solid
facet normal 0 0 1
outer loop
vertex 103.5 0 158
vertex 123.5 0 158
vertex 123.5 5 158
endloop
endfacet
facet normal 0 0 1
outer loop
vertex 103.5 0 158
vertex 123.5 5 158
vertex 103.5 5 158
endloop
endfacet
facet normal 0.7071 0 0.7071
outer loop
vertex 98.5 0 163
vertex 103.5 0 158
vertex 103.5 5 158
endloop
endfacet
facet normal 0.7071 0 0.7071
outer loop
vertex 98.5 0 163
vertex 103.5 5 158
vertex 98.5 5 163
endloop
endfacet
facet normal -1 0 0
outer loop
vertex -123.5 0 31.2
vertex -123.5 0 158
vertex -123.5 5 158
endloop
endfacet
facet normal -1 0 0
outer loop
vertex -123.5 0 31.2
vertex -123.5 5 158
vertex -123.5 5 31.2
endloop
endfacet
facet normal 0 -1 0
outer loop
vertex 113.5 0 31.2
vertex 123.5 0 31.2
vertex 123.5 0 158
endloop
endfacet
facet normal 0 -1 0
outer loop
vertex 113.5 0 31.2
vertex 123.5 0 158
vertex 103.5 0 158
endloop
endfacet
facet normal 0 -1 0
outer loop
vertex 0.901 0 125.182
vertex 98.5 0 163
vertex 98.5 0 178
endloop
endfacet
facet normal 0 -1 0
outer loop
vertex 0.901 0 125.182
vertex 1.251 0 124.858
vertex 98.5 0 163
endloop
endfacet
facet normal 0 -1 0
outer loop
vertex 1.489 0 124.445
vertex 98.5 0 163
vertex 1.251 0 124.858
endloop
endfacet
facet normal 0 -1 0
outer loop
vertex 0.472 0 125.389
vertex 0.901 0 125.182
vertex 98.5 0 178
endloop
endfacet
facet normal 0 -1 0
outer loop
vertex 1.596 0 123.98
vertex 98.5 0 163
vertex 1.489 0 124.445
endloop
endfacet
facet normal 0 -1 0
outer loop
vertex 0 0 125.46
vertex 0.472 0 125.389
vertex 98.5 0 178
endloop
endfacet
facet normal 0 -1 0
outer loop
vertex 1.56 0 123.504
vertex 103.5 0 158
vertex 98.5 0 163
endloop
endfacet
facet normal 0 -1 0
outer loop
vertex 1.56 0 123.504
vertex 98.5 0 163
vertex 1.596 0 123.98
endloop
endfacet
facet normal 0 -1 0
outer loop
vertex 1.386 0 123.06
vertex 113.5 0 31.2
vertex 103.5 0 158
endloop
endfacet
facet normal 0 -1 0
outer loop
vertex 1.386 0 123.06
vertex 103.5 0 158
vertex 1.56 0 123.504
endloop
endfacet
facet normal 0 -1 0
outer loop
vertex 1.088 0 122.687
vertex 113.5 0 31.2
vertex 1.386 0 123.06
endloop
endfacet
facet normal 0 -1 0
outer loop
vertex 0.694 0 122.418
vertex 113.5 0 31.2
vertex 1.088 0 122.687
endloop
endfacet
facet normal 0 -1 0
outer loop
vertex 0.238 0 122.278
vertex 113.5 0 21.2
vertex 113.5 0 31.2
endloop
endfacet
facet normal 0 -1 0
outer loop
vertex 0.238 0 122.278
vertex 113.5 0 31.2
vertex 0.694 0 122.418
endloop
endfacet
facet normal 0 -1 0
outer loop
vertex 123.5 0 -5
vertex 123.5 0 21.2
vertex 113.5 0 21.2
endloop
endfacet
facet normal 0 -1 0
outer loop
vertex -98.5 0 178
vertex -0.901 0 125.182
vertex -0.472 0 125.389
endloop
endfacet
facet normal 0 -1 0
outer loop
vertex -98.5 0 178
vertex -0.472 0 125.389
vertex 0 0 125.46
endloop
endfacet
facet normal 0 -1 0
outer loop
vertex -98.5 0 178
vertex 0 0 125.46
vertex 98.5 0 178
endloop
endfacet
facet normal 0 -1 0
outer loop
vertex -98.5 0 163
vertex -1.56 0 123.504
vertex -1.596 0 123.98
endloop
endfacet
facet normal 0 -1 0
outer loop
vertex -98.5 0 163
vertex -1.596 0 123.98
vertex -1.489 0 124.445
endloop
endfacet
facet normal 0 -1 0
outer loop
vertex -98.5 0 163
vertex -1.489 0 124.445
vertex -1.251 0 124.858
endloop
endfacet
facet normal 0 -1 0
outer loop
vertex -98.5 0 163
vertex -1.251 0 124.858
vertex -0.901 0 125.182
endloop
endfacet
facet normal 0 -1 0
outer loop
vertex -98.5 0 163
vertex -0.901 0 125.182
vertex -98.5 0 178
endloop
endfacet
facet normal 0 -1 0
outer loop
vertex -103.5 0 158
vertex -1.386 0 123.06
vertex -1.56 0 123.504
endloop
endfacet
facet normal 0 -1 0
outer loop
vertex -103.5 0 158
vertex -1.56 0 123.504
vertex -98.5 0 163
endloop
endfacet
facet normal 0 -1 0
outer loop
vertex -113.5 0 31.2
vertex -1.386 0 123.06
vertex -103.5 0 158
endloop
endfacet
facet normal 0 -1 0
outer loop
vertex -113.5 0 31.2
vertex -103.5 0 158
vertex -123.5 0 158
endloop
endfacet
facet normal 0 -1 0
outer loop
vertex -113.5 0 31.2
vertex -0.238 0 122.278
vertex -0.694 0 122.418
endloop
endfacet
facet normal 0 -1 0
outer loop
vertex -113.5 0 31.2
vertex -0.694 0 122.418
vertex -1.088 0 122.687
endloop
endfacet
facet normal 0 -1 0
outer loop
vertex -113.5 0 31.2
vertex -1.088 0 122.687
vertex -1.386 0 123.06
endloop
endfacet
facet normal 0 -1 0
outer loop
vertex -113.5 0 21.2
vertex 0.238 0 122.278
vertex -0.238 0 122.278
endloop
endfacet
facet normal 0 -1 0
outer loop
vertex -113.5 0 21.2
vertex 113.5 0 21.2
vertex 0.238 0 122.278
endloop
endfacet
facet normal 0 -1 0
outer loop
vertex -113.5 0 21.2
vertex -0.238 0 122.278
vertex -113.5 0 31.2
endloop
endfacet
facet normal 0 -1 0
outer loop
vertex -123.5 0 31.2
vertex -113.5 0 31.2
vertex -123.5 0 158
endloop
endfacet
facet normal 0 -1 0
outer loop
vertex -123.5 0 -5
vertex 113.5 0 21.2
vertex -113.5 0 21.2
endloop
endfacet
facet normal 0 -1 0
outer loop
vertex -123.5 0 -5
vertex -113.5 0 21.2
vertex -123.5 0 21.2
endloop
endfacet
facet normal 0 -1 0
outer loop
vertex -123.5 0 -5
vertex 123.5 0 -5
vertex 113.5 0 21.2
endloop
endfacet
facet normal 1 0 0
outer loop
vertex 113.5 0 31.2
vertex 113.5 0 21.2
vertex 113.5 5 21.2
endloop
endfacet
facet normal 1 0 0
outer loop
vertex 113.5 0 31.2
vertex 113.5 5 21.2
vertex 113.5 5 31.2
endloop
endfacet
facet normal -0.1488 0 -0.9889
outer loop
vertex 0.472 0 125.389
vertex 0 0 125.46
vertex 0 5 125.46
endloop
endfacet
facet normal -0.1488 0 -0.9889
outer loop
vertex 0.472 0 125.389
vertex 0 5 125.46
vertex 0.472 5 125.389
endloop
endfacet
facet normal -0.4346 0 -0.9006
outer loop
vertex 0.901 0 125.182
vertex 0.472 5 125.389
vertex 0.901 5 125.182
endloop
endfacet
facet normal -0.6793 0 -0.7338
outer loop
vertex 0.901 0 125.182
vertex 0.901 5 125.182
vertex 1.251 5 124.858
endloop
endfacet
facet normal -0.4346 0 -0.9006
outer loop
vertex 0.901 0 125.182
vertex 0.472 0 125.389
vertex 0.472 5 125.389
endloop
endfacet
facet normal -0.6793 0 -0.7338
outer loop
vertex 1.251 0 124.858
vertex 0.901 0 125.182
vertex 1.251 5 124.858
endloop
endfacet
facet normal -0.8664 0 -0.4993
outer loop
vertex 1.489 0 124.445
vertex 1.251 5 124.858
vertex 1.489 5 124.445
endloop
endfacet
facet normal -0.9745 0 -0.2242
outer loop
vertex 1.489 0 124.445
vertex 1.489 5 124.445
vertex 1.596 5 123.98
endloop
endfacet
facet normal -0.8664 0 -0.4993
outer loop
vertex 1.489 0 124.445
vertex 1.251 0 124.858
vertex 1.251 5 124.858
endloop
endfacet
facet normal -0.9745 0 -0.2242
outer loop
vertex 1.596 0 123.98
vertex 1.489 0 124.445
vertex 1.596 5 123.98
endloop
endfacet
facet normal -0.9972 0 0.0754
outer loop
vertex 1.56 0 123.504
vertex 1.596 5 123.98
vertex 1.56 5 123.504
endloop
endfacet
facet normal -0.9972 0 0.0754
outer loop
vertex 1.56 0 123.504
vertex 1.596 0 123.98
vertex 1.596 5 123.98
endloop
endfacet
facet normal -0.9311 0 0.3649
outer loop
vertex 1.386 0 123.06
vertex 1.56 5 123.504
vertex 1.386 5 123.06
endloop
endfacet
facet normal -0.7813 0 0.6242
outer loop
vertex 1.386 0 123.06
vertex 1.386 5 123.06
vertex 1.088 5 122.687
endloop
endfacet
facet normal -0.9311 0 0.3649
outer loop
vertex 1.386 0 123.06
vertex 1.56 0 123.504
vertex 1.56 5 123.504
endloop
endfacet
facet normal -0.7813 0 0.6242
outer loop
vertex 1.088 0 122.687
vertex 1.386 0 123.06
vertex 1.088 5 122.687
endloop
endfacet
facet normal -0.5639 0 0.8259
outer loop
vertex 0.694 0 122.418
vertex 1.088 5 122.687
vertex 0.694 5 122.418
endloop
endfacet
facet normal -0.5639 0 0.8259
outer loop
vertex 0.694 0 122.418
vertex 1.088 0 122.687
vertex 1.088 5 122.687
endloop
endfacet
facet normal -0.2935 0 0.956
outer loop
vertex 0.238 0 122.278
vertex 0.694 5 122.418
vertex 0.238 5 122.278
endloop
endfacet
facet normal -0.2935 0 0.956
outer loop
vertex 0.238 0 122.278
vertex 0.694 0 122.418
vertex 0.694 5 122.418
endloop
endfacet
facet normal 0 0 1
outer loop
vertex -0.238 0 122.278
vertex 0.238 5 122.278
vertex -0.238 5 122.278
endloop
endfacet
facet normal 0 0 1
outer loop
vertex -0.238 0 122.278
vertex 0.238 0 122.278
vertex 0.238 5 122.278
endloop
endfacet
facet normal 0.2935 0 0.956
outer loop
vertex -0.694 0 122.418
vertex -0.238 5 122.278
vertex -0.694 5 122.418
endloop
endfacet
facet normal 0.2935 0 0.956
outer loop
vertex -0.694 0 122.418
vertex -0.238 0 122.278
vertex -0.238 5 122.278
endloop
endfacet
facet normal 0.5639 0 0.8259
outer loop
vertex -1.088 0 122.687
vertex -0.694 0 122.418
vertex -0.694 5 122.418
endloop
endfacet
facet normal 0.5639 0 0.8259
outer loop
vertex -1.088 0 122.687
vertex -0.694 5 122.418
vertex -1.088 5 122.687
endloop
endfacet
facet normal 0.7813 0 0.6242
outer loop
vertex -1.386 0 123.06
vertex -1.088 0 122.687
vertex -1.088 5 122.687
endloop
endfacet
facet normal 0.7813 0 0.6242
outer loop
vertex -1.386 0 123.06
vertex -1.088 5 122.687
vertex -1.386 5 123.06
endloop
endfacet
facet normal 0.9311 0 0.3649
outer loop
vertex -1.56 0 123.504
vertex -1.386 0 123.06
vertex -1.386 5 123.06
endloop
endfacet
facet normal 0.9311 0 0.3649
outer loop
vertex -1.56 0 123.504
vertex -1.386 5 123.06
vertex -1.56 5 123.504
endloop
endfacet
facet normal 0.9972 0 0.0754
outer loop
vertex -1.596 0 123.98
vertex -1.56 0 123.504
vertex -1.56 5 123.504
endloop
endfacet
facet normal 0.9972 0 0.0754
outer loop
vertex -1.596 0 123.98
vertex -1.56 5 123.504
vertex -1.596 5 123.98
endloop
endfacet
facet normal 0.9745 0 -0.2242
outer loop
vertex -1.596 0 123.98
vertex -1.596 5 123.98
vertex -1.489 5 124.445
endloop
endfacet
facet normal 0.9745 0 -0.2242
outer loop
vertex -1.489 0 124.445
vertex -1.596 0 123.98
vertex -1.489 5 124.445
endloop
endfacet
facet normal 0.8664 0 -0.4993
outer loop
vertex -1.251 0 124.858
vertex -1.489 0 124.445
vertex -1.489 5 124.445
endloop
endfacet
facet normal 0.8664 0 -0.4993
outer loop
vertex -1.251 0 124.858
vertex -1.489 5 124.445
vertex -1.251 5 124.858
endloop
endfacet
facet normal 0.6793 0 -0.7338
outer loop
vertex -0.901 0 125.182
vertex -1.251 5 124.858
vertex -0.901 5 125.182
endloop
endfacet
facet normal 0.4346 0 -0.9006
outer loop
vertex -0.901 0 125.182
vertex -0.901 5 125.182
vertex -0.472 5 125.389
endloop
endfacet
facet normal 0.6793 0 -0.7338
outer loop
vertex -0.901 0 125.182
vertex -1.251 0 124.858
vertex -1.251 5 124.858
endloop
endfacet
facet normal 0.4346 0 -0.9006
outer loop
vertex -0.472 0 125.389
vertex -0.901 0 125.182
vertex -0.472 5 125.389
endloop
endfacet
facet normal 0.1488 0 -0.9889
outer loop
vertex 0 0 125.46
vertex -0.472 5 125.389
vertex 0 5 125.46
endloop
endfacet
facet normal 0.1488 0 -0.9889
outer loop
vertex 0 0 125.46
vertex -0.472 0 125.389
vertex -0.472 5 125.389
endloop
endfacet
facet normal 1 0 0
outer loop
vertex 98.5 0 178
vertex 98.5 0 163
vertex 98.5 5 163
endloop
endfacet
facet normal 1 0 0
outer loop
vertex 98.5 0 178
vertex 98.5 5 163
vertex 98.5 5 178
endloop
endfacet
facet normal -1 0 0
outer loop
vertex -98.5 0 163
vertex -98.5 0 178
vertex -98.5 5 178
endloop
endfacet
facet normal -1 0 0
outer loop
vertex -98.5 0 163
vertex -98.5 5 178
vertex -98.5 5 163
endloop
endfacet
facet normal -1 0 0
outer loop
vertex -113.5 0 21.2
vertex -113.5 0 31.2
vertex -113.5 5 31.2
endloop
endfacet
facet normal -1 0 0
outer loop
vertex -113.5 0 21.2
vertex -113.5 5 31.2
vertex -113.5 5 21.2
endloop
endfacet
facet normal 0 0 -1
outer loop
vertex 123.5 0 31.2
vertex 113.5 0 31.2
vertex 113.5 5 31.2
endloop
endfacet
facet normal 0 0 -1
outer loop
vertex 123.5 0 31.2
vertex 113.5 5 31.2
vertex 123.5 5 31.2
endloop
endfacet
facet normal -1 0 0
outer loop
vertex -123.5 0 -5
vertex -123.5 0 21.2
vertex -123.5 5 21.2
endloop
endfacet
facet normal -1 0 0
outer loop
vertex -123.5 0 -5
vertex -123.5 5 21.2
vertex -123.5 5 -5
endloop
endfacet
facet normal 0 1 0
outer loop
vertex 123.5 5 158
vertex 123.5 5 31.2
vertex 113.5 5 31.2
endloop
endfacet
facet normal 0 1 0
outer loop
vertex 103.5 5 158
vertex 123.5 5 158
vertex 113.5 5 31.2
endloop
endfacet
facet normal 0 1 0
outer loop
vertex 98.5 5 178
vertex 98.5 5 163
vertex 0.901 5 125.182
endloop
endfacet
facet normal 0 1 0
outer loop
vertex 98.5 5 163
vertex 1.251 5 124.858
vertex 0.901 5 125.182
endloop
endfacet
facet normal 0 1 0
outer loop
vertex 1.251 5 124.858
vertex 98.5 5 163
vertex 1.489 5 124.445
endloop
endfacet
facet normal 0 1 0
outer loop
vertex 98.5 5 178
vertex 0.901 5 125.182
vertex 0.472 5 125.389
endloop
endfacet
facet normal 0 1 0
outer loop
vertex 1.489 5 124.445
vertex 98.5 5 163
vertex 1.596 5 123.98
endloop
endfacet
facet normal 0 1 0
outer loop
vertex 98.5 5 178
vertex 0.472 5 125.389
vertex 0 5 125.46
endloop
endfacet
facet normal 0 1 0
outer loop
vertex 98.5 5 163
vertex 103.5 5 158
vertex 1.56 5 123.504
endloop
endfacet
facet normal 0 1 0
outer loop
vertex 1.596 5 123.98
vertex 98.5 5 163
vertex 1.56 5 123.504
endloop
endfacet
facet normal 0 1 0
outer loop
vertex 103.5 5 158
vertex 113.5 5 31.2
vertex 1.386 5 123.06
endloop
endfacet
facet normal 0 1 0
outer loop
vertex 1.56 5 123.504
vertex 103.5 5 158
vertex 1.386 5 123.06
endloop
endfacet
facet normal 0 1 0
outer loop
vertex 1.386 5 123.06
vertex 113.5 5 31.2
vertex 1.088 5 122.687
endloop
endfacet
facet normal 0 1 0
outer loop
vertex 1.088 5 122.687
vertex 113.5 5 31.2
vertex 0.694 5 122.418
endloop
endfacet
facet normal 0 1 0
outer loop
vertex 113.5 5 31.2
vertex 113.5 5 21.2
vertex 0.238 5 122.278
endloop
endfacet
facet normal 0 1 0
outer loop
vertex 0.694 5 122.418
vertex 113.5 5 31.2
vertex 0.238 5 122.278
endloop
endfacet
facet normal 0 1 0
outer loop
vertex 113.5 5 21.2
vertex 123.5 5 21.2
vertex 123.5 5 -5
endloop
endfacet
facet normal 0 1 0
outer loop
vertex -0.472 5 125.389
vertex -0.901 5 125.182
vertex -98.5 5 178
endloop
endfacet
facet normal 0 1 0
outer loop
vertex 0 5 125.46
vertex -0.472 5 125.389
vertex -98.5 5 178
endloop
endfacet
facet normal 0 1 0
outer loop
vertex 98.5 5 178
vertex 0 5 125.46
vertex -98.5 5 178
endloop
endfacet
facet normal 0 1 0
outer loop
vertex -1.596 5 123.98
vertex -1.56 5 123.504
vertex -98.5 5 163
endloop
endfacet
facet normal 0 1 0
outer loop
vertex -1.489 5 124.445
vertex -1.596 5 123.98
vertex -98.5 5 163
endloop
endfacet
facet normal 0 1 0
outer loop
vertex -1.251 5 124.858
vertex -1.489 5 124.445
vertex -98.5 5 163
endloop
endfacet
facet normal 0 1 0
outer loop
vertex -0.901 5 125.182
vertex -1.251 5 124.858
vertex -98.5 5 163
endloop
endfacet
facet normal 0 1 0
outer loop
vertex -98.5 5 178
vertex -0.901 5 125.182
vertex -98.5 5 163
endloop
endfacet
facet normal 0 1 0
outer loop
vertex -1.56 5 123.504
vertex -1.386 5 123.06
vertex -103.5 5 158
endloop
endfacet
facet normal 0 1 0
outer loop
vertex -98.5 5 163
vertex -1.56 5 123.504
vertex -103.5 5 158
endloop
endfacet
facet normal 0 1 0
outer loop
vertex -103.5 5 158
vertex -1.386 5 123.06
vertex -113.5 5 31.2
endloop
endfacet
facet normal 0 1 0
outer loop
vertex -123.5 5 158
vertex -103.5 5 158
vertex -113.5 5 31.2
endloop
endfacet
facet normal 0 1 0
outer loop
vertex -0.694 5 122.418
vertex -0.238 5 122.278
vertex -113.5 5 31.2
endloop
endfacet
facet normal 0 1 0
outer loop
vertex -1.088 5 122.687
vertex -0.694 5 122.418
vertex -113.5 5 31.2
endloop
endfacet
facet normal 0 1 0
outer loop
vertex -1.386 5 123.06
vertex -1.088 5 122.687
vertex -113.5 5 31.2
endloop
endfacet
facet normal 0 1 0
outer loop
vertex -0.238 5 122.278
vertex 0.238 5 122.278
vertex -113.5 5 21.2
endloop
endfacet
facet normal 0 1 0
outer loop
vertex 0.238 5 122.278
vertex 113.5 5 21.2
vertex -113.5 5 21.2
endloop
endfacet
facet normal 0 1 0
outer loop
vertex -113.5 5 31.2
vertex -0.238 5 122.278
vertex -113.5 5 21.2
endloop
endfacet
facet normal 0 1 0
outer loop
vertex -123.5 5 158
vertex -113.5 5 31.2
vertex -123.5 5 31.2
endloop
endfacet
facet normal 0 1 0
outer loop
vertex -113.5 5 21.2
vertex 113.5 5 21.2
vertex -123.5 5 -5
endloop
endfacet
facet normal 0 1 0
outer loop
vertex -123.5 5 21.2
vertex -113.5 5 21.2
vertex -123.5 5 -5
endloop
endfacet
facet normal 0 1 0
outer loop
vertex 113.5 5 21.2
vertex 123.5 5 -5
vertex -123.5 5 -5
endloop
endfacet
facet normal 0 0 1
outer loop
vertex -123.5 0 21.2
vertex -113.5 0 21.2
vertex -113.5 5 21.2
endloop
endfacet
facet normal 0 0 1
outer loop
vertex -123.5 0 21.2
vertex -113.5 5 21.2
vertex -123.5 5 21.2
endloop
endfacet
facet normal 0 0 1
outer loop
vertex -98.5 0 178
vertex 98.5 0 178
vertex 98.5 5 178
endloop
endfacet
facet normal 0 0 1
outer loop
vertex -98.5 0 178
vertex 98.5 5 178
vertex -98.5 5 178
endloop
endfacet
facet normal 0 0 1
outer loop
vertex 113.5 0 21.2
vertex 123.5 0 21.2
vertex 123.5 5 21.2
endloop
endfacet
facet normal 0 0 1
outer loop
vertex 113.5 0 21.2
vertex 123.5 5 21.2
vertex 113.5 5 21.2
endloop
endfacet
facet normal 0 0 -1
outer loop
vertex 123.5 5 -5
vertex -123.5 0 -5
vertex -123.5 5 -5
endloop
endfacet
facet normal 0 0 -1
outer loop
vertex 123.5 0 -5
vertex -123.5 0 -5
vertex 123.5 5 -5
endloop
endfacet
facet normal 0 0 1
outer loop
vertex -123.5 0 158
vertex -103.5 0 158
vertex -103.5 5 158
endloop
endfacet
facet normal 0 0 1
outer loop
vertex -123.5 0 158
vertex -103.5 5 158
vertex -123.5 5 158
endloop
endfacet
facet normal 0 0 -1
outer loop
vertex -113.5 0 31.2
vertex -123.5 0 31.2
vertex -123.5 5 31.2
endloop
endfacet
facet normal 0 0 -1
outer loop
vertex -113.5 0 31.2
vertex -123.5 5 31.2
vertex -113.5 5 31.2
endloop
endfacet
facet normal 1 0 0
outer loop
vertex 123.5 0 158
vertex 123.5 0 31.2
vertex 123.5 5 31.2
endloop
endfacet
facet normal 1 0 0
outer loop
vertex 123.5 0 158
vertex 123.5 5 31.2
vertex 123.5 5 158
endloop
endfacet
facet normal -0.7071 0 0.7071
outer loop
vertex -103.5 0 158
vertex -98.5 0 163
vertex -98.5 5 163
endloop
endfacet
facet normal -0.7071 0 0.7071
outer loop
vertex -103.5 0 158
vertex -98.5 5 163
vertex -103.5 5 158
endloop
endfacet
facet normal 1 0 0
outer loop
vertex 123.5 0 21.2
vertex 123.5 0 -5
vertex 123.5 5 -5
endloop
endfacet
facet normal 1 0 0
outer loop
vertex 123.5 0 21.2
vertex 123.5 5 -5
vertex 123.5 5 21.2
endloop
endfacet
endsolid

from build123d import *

# Parameters (mm, degrees)
ESQUISSE1_R        = 1.6
BOSS_EXTRU_1_DEPTH = 5


with BuildPart() as part:
    # Esquisse1 → Boss.-Extru.1 (new body)
    with BuildSketch(Plane(origin=(0, 0, 0), x_dir=(1, 0, 0), z_dir=(0, 1, 0))):
        Polygon((-123.5, 5), (123.5, 5), (123.5, -21.2), (113.5, -21.2), (113.5, -31.2), (123.5, -31.2), (123.5, -158), (103.5, -158), (98.5, -163), (98.5, -178), (-98.5, -178), (-98.5, -163), (-103.5, -158), (-123.5, -158), (-123.5, -31.2), (-113.5, -31.2), (-113.5, -21.2), (-123.5, -21.2), align=None)
        with Locations(Location((0, -123.86, 0), (0, 0, 270))):
            Circle(ESQUISSE1_R, mode=Mode.SUBTRACT)
    extrude(amount=BOSS_EXTRU_1_DEPTH)


solid = part.part
